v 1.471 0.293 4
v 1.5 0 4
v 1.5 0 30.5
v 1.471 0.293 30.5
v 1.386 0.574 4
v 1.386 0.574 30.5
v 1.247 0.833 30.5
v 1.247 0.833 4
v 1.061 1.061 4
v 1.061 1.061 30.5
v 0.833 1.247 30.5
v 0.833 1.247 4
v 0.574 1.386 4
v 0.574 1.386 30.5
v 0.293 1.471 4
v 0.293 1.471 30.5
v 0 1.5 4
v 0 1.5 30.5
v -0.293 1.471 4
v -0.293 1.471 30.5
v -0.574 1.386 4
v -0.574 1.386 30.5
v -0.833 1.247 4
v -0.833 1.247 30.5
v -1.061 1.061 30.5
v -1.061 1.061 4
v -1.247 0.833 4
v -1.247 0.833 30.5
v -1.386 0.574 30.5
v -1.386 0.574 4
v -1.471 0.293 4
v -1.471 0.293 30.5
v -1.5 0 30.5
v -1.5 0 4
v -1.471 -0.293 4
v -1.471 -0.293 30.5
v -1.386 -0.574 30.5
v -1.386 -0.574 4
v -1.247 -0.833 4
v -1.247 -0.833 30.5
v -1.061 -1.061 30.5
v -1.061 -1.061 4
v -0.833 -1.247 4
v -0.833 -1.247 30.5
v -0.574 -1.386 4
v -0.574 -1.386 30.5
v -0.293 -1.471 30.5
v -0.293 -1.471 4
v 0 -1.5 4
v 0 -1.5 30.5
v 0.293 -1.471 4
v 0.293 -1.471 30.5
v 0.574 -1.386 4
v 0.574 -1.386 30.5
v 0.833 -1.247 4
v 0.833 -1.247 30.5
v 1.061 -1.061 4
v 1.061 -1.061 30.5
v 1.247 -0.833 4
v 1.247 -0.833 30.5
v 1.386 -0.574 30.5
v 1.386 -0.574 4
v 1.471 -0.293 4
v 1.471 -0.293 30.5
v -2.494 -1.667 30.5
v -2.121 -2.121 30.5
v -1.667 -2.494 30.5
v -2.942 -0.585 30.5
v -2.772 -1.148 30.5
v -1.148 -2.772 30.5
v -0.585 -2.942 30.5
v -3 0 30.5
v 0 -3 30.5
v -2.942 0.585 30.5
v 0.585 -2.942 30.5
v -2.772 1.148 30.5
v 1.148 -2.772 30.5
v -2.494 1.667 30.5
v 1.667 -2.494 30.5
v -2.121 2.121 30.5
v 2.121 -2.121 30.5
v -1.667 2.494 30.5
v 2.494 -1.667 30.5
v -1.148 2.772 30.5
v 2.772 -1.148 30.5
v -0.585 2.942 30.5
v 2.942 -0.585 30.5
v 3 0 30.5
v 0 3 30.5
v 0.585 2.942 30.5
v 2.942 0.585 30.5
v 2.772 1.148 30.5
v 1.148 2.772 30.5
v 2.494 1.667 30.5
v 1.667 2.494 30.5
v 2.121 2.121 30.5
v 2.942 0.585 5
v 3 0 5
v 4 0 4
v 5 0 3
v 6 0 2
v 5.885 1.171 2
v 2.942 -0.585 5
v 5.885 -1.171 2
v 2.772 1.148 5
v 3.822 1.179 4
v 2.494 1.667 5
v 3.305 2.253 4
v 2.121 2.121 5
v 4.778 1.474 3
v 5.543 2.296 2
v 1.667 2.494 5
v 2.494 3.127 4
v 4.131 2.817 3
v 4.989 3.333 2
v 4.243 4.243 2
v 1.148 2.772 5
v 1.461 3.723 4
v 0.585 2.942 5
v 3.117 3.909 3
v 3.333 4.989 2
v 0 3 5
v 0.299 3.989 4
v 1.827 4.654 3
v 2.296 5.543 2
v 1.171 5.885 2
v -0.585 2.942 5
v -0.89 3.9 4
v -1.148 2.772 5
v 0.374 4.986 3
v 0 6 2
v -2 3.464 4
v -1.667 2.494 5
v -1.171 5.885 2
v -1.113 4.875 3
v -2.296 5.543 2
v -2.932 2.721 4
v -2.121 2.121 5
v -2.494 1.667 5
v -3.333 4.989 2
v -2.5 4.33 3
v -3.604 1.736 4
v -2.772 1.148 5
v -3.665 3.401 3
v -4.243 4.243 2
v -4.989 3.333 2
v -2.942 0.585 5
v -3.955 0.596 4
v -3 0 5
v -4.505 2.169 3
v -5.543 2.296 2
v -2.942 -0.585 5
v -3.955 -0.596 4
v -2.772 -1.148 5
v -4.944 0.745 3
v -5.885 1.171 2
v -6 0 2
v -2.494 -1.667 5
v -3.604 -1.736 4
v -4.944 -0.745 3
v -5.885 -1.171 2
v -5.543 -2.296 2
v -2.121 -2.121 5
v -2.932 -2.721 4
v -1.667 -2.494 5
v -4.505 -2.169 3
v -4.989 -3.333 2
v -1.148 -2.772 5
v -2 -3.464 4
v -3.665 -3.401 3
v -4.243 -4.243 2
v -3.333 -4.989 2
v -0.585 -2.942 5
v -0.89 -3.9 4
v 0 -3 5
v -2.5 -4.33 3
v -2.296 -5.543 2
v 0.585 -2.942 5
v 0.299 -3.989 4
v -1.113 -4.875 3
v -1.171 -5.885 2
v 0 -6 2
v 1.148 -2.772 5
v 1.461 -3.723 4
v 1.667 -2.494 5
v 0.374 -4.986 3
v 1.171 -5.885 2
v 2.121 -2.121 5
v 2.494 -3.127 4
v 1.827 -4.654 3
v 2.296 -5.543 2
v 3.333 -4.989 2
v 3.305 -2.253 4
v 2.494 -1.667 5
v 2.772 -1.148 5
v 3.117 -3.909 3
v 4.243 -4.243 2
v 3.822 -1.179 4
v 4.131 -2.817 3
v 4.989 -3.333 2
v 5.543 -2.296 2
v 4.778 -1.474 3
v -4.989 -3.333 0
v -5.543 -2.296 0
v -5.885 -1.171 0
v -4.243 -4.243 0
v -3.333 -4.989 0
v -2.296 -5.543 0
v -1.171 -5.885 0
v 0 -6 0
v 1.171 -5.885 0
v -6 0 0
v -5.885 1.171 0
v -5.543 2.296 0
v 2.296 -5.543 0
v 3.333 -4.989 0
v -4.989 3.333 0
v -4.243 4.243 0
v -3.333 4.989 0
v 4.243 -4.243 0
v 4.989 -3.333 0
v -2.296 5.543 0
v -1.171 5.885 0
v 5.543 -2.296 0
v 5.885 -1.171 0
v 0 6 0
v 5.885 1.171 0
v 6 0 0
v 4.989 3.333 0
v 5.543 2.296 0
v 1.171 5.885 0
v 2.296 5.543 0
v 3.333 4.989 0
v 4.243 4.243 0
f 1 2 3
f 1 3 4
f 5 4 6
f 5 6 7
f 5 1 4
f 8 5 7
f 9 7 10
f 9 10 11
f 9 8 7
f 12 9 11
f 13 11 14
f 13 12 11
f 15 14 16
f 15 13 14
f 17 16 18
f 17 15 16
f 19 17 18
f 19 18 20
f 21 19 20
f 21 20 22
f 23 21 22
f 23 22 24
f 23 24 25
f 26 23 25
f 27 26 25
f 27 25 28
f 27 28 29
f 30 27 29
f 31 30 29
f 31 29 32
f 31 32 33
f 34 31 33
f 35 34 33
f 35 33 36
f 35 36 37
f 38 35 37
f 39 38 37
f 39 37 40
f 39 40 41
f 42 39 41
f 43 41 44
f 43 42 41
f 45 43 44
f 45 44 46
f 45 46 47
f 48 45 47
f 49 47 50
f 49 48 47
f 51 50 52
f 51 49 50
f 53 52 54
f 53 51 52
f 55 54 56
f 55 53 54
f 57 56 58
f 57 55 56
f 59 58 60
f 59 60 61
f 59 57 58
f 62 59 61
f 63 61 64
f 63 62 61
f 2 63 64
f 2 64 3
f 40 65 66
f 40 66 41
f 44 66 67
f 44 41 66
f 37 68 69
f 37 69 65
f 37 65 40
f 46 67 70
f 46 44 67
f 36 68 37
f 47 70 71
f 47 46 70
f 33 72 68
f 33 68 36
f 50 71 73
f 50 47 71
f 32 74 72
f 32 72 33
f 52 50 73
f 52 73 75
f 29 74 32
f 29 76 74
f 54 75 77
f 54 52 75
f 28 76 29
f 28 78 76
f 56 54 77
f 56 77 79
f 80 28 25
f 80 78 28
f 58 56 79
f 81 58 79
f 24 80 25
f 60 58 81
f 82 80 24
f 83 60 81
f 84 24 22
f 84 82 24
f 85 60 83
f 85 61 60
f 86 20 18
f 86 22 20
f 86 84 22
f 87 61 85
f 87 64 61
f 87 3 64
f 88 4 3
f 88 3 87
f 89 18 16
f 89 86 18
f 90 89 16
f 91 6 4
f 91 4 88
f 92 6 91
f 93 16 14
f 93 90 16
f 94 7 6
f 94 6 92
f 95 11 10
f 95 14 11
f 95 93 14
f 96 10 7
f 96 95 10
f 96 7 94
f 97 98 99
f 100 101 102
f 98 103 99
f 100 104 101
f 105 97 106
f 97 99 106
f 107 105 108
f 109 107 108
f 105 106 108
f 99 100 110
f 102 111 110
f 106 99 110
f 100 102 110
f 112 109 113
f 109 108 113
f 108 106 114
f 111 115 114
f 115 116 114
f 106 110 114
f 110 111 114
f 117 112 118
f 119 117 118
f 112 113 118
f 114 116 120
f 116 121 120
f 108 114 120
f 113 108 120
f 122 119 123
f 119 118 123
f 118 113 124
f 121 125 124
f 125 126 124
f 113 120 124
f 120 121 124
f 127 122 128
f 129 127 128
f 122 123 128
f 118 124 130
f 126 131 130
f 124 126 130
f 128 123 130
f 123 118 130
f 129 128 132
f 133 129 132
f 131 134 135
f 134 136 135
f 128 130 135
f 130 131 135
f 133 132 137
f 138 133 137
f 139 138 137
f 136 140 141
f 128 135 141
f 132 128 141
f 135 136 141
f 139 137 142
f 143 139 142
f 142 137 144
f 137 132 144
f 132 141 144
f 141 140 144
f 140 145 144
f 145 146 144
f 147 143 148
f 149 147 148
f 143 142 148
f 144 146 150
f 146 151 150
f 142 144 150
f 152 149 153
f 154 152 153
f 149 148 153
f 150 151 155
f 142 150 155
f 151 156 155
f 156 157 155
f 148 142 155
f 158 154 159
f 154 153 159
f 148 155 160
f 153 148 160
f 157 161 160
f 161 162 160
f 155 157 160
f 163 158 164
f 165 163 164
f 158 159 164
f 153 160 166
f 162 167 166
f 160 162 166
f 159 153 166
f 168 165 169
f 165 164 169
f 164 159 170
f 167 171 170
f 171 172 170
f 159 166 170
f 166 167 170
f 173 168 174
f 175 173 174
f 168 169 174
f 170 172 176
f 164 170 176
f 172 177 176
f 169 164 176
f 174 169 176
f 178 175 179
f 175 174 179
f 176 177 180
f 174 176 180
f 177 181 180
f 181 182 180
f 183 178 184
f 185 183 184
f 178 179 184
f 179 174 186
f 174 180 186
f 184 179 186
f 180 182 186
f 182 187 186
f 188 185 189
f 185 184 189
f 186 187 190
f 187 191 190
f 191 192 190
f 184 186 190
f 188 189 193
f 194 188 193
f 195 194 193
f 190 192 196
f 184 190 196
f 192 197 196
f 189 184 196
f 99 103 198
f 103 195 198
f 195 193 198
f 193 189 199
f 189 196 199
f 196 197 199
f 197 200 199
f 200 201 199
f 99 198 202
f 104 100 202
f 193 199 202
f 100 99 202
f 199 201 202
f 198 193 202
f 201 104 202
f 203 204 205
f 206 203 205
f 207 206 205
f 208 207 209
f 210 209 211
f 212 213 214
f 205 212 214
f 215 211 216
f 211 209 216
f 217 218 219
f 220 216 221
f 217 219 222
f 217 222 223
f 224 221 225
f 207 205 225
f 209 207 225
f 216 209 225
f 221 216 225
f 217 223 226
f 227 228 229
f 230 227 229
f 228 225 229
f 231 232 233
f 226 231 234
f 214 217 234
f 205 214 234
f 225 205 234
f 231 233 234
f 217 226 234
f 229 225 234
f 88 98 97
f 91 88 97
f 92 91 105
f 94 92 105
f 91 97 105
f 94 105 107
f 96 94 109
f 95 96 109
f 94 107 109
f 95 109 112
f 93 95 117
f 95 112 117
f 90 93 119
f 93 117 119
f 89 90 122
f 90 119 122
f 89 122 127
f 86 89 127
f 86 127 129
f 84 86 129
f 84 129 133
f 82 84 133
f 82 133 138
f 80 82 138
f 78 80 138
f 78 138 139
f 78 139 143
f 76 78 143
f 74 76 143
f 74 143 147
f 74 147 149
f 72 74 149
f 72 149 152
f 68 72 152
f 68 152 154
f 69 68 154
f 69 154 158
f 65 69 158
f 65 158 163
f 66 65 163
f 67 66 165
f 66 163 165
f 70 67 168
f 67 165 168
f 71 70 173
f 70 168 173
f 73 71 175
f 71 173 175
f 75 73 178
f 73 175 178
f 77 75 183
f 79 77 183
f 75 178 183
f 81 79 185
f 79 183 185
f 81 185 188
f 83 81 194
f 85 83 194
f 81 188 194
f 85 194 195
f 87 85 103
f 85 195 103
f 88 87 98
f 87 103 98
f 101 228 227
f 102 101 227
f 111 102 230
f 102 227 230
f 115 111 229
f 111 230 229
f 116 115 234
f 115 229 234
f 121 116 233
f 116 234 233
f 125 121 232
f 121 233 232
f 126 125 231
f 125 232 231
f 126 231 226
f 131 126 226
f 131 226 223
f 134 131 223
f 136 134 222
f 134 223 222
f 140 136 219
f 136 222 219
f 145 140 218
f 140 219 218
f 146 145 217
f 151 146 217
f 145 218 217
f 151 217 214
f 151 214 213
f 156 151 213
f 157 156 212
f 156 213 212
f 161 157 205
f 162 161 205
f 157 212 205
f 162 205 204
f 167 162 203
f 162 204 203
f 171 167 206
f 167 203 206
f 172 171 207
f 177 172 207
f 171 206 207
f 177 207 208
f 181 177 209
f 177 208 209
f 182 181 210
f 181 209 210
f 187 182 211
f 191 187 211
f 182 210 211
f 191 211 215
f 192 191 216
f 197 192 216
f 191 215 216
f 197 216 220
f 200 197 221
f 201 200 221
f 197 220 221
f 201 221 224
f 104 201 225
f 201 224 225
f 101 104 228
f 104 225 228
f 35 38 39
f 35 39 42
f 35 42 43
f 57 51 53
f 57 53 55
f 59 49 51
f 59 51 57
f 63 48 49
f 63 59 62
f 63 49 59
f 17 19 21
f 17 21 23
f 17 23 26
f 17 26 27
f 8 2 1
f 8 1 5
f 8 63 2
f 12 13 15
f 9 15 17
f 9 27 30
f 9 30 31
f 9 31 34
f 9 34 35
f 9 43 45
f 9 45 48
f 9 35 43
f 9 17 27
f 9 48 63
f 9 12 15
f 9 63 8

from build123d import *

# Parameters (mm, degrees)
F0_R     = 6
F0_R_2   = 3
F1_DEPTH = 2
F0_R_3   = 1.5
F2_DEPTH = 4
F4_DEPTH = 30.5
F5_SIZE  = 2.99999


# Not quite as in the source:
# - a fillet or chamfer is up to 0.001 mm smaller than in the source, because OpenCascade refuses the exact size


with BuildPart() as f1:
    # F0 (on Top) → F1 (new body)
    with BuildSketch(Plane.XY):
        Circle(F0_R)
        Circle(F0_R_2, mode=Mode.SUBTRACT)
    extrude(amount=F1_DEPTH)



with BuildPart() as f2:
    # F0 (on Top) → F2 (new body)
    with BuildSketch(Plane.XY):
        Circle(F0_R_3)
    extrude(amount=F2_DEPTH)


with BuildPart() as f1_1:
    add(f1.part)

    add(f2.part)  # F4 merges F2
    # F0 (on Top) → F4 (join)
    with BuildSketch(Plane.XY):
        Circle(F0_R_2)
        Circle(F0_R_3, mode=Mode.SUBTRACT)
    extrude(amount=F4_DEPTH)

    # F5 (size 3 in the source; OpenCascade refuses exactly that, so slightly less here)
    f5_edges = [f1_1.edges().sort_by_distance(p)[0] for p in [
        (-3, 0, 2),
    ]]
    chamfer(f5_edges, length=F5_SIZE)


solid = f1_1.part
